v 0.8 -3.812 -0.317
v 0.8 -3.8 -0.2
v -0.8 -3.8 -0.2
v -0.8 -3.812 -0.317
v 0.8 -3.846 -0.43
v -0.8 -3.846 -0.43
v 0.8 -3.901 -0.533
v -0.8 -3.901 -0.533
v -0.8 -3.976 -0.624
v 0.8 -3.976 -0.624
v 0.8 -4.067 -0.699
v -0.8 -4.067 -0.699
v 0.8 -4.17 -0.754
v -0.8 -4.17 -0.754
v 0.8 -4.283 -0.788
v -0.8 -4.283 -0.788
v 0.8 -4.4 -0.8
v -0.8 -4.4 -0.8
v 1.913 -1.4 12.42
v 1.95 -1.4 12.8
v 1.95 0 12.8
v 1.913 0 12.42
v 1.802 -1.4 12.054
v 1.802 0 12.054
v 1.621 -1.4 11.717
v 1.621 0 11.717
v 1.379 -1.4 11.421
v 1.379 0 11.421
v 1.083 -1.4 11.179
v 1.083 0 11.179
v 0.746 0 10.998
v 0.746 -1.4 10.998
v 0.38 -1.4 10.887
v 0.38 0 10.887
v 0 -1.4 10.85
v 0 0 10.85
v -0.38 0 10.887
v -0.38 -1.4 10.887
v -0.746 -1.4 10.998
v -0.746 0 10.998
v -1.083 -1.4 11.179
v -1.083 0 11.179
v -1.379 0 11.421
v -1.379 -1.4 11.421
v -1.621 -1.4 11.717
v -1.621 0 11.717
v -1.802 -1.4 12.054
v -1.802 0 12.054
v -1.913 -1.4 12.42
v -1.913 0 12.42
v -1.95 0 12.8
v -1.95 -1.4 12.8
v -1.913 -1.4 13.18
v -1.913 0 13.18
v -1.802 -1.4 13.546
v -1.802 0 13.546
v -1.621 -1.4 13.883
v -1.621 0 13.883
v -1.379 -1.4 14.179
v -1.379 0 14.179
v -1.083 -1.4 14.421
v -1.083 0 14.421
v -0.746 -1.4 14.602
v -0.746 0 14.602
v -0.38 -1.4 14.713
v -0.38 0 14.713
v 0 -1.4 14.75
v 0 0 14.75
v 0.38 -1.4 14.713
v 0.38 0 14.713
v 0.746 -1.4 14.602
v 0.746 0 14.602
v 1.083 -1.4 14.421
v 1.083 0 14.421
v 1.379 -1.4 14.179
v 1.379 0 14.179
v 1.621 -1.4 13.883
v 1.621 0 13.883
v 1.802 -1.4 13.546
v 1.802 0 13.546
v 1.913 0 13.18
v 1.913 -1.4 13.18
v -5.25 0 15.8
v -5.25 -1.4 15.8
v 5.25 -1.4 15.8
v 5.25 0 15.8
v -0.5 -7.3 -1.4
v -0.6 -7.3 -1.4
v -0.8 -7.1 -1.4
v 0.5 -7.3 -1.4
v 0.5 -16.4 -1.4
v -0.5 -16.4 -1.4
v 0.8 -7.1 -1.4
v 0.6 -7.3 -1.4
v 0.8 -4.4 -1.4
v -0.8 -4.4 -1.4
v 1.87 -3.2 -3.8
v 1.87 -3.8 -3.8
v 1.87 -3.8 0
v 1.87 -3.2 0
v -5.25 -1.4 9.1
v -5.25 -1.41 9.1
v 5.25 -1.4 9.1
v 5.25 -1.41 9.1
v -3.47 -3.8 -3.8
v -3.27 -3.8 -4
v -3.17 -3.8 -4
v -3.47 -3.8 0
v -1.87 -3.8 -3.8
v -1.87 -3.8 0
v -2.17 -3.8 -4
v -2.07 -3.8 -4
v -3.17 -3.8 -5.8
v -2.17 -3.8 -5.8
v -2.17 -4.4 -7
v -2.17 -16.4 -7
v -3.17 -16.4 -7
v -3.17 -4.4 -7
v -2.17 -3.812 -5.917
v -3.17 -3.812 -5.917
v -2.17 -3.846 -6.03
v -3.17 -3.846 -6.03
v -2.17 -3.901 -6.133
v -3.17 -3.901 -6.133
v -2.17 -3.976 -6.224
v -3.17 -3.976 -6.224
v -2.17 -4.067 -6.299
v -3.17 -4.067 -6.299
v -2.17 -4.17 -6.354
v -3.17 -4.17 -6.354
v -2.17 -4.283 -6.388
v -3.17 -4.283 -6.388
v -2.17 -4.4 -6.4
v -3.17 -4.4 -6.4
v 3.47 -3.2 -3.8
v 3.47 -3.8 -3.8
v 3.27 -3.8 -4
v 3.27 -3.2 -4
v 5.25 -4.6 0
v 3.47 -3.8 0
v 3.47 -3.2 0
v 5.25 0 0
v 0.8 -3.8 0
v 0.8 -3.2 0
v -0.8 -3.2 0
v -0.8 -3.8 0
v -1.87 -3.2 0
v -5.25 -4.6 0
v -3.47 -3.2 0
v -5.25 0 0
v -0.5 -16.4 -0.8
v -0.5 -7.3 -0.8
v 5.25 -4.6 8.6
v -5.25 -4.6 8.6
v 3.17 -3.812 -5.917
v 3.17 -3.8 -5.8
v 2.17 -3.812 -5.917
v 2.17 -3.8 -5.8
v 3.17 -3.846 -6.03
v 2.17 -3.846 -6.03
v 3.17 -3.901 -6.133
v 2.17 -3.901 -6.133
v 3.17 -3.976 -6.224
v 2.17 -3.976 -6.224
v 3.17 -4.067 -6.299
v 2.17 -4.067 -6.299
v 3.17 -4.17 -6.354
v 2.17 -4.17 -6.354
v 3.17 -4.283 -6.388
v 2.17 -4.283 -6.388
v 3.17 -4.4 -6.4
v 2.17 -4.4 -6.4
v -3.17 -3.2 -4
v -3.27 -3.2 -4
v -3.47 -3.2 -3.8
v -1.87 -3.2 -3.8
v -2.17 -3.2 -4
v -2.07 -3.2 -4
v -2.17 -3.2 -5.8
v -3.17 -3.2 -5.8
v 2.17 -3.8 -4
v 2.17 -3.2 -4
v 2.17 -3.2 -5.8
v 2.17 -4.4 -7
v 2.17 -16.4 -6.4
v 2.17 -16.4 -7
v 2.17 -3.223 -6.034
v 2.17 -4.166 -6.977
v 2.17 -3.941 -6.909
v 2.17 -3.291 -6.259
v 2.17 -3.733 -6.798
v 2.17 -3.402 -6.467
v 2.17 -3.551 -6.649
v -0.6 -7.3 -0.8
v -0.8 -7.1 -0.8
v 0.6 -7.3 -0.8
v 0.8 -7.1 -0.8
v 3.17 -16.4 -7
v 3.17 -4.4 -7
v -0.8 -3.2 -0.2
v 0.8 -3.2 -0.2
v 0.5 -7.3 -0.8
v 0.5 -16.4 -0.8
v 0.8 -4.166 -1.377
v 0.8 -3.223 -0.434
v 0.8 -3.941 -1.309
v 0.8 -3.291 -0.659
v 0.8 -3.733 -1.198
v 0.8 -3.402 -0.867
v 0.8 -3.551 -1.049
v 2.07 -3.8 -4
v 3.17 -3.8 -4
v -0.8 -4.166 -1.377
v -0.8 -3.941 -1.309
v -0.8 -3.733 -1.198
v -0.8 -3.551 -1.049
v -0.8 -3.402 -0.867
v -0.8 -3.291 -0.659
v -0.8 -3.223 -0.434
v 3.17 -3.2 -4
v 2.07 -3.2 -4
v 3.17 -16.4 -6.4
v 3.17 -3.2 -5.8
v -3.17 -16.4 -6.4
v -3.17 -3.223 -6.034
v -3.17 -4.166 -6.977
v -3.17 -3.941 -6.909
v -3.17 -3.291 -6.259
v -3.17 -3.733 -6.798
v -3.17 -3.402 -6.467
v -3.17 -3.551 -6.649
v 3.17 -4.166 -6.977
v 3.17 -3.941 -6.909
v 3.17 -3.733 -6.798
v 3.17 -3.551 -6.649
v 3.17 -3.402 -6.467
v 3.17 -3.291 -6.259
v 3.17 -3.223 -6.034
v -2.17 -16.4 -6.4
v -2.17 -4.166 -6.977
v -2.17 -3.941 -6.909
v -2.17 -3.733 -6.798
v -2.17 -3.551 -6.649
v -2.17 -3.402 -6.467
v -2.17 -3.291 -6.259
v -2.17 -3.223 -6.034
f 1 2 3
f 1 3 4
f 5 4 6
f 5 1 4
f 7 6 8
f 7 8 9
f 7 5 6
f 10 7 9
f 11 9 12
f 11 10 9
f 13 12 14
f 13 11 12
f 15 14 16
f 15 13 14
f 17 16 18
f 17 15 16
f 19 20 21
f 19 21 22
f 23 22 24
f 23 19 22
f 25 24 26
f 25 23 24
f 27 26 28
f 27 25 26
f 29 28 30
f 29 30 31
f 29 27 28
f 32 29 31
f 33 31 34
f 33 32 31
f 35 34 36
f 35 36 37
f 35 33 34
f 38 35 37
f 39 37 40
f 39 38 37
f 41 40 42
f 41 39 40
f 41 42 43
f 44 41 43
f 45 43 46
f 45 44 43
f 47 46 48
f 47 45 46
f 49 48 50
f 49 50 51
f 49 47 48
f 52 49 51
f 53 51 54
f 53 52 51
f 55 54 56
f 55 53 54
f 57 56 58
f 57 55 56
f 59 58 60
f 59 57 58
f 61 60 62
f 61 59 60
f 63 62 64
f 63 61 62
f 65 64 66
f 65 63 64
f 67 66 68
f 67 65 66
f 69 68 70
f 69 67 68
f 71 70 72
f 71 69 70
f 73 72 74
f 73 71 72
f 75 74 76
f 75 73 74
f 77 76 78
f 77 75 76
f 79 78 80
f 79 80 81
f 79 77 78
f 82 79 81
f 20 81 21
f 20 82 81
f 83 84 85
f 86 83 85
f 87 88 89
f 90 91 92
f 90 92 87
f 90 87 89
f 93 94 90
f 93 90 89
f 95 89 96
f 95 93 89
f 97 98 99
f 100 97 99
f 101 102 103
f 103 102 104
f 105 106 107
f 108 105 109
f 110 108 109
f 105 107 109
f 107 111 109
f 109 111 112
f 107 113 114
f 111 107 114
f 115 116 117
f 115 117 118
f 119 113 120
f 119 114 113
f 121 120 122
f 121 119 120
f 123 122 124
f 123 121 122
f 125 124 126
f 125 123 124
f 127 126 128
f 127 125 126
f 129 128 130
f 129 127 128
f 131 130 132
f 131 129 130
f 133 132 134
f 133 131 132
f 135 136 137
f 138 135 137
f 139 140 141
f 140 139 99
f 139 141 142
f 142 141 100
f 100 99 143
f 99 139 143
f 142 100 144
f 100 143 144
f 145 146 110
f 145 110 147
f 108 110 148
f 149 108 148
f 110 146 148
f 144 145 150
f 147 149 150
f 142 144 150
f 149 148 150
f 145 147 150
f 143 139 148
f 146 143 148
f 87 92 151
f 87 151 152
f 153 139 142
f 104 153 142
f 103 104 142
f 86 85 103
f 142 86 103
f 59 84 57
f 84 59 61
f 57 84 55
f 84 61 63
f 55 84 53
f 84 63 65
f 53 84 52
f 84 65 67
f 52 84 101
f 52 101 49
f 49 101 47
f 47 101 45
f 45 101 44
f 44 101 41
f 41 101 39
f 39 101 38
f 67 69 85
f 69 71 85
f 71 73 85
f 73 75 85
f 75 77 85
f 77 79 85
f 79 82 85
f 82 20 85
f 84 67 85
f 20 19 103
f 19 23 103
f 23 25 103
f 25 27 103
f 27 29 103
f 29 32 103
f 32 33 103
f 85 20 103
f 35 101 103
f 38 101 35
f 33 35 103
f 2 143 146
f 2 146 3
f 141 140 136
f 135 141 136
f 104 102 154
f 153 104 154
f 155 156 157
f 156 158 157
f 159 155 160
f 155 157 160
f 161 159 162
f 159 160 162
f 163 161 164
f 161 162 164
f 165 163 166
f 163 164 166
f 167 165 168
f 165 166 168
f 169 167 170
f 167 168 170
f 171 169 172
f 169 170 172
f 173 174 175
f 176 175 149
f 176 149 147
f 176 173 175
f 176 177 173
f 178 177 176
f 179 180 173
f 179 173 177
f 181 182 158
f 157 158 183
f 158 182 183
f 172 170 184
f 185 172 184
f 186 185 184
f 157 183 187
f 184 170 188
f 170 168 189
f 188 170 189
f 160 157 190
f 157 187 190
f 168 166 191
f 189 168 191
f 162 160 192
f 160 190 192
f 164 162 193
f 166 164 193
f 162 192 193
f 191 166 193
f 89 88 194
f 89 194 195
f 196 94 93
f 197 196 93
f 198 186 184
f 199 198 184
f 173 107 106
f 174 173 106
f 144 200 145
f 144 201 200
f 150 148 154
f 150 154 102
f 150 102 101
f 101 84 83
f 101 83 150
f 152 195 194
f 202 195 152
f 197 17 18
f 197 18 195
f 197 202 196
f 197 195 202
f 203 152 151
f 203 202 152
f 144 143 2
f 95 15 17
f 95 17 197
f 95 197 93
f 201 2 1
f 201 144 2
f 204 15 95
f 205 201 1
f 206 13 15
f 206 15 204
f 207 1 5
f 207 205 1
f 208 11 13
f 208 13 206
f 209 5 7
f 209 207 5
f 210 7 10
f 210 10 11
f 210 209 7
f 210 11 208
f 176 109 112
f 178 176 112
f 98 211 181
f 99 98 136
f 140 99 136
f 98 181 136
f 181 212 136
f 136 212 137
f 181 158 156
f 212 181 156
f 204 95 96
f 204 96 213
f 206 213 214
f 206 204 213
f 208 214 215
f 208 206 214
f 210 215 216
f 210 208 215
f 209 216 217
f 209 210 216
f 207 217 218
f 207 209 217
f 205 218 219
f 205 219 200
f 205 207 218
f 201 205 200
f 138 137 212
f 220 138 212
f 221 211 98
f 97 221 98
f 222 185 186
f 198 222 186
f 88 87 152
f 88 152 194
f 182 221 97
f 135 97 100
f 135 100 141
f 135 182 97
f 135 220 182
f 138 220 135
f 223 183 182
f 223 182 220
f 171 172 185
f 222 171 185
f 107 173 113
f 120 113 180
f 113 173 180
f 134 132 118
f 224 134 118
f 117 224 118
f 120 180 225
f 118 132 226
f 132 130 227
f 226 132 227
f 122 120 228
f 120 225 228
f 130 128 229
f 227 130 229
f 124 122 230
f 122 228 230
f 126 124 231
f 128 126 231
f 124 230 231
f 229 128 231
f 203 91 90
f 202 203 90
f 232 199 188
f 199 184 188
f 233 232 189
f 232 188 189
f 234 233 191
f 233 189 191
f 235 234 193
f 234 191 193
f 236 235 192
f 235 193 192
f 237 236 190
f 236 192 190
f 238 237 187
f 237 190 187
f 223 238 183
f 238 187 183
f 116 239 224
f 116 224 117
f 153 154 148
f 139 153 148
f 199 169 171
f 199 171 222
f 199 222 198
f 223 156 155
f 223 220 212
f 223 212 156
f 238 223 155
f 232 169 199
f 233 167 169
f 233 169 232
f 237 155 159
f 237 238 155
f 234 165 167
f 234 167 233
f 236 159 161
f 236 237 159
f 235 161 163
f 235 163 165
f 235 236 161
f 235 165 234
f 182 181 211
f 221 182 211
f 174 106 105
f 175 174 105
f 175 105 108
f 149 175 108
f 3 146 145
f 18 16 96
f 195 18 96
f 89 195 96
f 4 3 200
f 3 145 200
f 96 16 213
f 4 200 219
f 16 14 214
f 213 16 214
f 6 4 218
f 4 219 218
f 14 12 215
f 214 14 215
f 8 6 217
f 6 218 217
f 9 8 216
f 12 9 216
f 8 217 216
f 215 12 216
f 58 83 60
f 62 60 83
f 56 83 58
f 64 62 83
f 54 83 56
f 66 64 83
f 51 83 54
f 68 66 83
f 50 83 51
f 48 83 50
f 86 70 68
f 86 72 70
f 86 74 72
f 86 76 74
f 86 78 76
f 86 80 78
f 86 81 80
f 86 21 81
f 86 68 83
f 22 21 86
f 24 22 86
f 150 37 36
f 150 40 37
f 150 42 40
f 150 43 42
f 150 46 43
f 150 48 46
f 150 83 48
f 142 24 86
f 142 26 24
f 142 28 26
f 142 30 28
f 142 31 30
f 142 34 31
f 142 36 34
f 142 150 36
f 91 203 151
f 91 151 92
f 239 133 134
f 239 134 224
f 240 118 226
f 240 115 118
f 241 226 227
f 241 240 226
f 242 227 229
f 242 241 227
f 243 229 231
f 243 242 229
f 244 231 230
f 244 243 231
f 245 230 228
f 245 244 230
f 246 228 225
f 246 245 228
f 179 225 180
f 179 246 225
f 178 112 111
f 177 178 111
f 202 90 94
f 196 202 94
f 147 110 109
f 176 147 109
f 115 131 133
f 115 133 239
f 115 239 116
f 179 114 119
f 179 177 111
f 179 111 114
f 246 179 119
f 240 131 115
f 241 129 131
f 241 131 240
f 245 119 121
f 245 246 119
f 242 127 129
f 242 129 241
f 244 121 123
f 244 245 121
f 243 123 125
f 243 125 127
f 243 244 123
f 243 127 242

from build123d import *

# Parameters (mm, degrees)
CORTAR_EXTRUIR1_START       = 1.8
CORTAR_EXTRUIR1_OUTLINE_W   = 10.5
CORTAR_EXTRUIR1_OUTLINE_H   = 15.8
CORTAR_EXTRUIR1_OUTLINE_R   = 1.95
CORTAR_EXTRUIR1_DEPTH       = 1.4
CORTAR_EXTRUIR1_START_2     = -0.6
CORTAR_EXTRUIR1_2_DEPTH     = 0.6
CORTAR_EXTRUIR1_START_3     = 1.79
CORTAR_EXTRUIR1_3_OUTLINE_W = 10.5
CORTAR_EXTRUIR1_3_OUTLINE_H = 9.1
CORTAR_EXTRUIR1_3_DEPTH     = 0.01
CORTAR_EXTRUIR1_START_4     = -5.25
CORTAR_EXTRUIR1_4_DEPTH     = 10.5
CROQUIS2_W                  = 1.6
CROQUIS2_H                  = 4.4
CORTAR_EXTRUIR2_DEPTH       = 10
EXTRUIR_L_MINA1_DEPTH       = 0.8
CROQUIS5_W                  = 8.6
CROQUIS5_H                  = 0.6
CORTAR_EXTRUIR3_DEPTH       = 25.279546948
EXTRUIR_L_MINA2_DEPTH       = 0.5
CUT_EXTRUDE1_DEPTH          = 10


with BuildPart() as part:
    # Cortar-Extruir1: read off the stored shape, not the designer's step
    # Cortar-Extruir1 outline → Cortar-Extruir1 (new body)
    with BuildSketch(Plane(origin=(0, -3.2, 0), x_dir=(1, 0, 0), z_dir=(0, 1, 0)).offset(CORTAR_EXTRUIR1_START)):
        with Locations((0, -7.9)):
            Rectangle(CORTAR_EXTRUIR1_OUTLINE_W, CORTAR_EXTRUIR1_OUTLINE_H)
        with Locations((0, -12.8)):
            Circle(CORTAR_EXTRUIR1_OUTLINE_R, mode=Mode.SUBTRACT)
    extrude(amount=CORTAR_EXTRUIR1_DEPTH)

    # Cortar-Extruir1 3 outline → Cortar-Extruir1 3 (add)
    with BuildSketch(Plane(origin=(0, -3.2, 0), x_dir=(1, 0, 0), z_dir=(0, 1, 0)).offset(CORTAR_EXTRUIR1_START_3)):
        with Locations((0, -4.55)):
            Rectangle(CORTAR_EXTRUIR1_3_OUTLINE_W, CORTAR_EXTRUIR1_3_OUTLINE_H)
    extrude(amount=CORTAR_EXTRUIR1_3_DEPTH)



with BuildPart() as body_2:
    # Cortar-Extruir1 2 outline → Cortar-Extruir1 2 (new body)
    with BuildSketch(Plane(origin=(0, -3.2, 0), x_dir=(1, 0, 0), z_dir=(0, 1, 0)).offset(CORTAR_EXTRUIR1_START_2)):
        Polygon((1.87, 0), (3.47, 0), (3.47, 3.8), (3.27, 4), (3.17, 4), (3.17, 14.4), (2.17, 14.4), (2.17, 4), (2.07, 4), (1.87, 3.8), align=None)
        Polygon((-0.8, 0), (0.8, 0), (0.8, 3.8), (0.6, 4), (0.5, 4), (0.5, 4.5), (-0.5, 4.5), (-0.5, 4), (-0.6, 4), (-0.8, 3.8), align=None)
        Polygon((-3.47, 0), (-1.87, 0), (-1.87, 3.8), (-2.07, 4), (-2.17, 4), (-2.17, 14.4), (-3.17, 14.4), (-3.17, 4), (-3.27, 4), (-3.47, 3.8), align=None)
    extrude(amount=CORTAR_EXTRUIR1_2_DEPTH)


with BuildPart() as part_1:
    add(part.part)

    add(body_2.part)  # Cortar-Extruir1 4 merges body 2
    # Cortar-Extruir1 4 outline → Cortar-Extruir1 4 (add)
    with BuildSketch(Plane.YZ.offset(CORTAR_EXTRUIR1_START_4)):
        Polygon((-1.41, 9.1), (-4.6, 8.6), (-4.6, 0), (-1.41, 0), align=None)
    extrude(amount=CORTAR_EXTRUIR1_4_DEPTH)

    # Croquis2 → Cortar-Extruir2 (cut)
    with BuildSketch(Plane(origin=(0, -3.2, 0), x_dir=(1, 0, 0), z_dir=(0, 1, 0))):
        with Locations((0, 2.3)):
            Rectangle(CROQUIS2_W, CROQUIS2_H)
    extrude(amount=-CORTAR_EXTRUIR2_DEPTH, mode=Mode.SUBTRACT)

    # Croquis3 → Extruir-Lámina1 (add, symmetric)
    with BuildSketch(Plane(origin=(0, 0, 0), x_dir=(0, 0, -1), z_dir=(1, 0, 0))):
        with BuildLine():
            Line((0.1, -3.8), (0.2, -3.8))
            ThreePointArc((0.2, -3.8), (0.624264069, -3.975735931), (0.8, -4.4))
            Line((0.8, -4.4), (0.8, -16.4))
            Line((0.8, -16.4), (1.4, -16.4))
            Line((1.4, -16.4), (1.4, -4.4))
            ThreePointArc((1.4, -4.4), (1.048528137, -3.551471863), (0.2, -3.2))
            Line((0.2, -3.2), (0.1, -3.2))
            Line((0.1, -3.2), (0.1, -3.8))
        make_face()
    extrude(amount=EXTRUIR_L_MINA1_DEPTH, both=True)

    # Croquis5 → Cortar-Extruir3 (cut, through all)
    with BuildSketch(Plane(origin=(3.17, 0, 0), x_dir=(0, 0, -1), z_dir=(1, 0, 0))):
        with Locations((10.1, -3.5)):
            Rectangle(CROQUIS5_W, CROQUIS5_H)
    extrude(amount=-CORTAR_EXTRUIR3_DEPTH, mode=Mode.SUBTRACT)

    # Croquis6 → Extruir-Lámina2 (add, symmetric)
    with BuildSketch(Plane(origin=(-2.67, 0, 0), x_dir=(0, 0, -1), z_dir=(1, 0, 0))):
        with BuildLine():
            ThreePointArc((5.8, -3.8), (6.224264069, -3.975735931), (6.4, -4.4))
            Line((6.4, -4.4), (6.4, -16.4))
            Line((6.4, -16.4), (7, -16.4))
            Line((7, -16.4), (7, -4.4))
            ThreePointArc((7, -4.4), (6.648528137, -3.551471863), (5.8, -3.2))
            Line((5.8, -3.2), (5.8, -3.8))
        make_face()
    extruir_l_mina2 = extrude(amount=EXTRUIR_L_MINA2_DEPTH, both=True)

    # Simetría1: Extruir-Lámina2 across plane
    add(extruir_l_mina2.mirror(Plane(origin=(0, 0, 0), x_dir=(0, 0, 1), z_dir=(1, 0, 0))))

    # Sketch2 → Cut-Extrude1 (cut)
    with BuildSketch(Plane(origin=(0, 0, -1.4), x_dir=(-1, 0, 0), z_dir=(0, 0, -1))):
        Polygon((-0.5, -16.4), (-0.5, -7.3), (-0.6, -7.3), (-0.8, -7.1), (-0.8, -16.4), align=None)
        Polygon((0.8, -16.4), (0.5, -16.4), (0.5, -7.3), (0.6, -7.3), (0.8, -7.1), align=None)
    extrude(amount=-CUT_EXTRUDE1_DEPTH, mode=Mode.SUBTRACT)


solid = part_1.part
